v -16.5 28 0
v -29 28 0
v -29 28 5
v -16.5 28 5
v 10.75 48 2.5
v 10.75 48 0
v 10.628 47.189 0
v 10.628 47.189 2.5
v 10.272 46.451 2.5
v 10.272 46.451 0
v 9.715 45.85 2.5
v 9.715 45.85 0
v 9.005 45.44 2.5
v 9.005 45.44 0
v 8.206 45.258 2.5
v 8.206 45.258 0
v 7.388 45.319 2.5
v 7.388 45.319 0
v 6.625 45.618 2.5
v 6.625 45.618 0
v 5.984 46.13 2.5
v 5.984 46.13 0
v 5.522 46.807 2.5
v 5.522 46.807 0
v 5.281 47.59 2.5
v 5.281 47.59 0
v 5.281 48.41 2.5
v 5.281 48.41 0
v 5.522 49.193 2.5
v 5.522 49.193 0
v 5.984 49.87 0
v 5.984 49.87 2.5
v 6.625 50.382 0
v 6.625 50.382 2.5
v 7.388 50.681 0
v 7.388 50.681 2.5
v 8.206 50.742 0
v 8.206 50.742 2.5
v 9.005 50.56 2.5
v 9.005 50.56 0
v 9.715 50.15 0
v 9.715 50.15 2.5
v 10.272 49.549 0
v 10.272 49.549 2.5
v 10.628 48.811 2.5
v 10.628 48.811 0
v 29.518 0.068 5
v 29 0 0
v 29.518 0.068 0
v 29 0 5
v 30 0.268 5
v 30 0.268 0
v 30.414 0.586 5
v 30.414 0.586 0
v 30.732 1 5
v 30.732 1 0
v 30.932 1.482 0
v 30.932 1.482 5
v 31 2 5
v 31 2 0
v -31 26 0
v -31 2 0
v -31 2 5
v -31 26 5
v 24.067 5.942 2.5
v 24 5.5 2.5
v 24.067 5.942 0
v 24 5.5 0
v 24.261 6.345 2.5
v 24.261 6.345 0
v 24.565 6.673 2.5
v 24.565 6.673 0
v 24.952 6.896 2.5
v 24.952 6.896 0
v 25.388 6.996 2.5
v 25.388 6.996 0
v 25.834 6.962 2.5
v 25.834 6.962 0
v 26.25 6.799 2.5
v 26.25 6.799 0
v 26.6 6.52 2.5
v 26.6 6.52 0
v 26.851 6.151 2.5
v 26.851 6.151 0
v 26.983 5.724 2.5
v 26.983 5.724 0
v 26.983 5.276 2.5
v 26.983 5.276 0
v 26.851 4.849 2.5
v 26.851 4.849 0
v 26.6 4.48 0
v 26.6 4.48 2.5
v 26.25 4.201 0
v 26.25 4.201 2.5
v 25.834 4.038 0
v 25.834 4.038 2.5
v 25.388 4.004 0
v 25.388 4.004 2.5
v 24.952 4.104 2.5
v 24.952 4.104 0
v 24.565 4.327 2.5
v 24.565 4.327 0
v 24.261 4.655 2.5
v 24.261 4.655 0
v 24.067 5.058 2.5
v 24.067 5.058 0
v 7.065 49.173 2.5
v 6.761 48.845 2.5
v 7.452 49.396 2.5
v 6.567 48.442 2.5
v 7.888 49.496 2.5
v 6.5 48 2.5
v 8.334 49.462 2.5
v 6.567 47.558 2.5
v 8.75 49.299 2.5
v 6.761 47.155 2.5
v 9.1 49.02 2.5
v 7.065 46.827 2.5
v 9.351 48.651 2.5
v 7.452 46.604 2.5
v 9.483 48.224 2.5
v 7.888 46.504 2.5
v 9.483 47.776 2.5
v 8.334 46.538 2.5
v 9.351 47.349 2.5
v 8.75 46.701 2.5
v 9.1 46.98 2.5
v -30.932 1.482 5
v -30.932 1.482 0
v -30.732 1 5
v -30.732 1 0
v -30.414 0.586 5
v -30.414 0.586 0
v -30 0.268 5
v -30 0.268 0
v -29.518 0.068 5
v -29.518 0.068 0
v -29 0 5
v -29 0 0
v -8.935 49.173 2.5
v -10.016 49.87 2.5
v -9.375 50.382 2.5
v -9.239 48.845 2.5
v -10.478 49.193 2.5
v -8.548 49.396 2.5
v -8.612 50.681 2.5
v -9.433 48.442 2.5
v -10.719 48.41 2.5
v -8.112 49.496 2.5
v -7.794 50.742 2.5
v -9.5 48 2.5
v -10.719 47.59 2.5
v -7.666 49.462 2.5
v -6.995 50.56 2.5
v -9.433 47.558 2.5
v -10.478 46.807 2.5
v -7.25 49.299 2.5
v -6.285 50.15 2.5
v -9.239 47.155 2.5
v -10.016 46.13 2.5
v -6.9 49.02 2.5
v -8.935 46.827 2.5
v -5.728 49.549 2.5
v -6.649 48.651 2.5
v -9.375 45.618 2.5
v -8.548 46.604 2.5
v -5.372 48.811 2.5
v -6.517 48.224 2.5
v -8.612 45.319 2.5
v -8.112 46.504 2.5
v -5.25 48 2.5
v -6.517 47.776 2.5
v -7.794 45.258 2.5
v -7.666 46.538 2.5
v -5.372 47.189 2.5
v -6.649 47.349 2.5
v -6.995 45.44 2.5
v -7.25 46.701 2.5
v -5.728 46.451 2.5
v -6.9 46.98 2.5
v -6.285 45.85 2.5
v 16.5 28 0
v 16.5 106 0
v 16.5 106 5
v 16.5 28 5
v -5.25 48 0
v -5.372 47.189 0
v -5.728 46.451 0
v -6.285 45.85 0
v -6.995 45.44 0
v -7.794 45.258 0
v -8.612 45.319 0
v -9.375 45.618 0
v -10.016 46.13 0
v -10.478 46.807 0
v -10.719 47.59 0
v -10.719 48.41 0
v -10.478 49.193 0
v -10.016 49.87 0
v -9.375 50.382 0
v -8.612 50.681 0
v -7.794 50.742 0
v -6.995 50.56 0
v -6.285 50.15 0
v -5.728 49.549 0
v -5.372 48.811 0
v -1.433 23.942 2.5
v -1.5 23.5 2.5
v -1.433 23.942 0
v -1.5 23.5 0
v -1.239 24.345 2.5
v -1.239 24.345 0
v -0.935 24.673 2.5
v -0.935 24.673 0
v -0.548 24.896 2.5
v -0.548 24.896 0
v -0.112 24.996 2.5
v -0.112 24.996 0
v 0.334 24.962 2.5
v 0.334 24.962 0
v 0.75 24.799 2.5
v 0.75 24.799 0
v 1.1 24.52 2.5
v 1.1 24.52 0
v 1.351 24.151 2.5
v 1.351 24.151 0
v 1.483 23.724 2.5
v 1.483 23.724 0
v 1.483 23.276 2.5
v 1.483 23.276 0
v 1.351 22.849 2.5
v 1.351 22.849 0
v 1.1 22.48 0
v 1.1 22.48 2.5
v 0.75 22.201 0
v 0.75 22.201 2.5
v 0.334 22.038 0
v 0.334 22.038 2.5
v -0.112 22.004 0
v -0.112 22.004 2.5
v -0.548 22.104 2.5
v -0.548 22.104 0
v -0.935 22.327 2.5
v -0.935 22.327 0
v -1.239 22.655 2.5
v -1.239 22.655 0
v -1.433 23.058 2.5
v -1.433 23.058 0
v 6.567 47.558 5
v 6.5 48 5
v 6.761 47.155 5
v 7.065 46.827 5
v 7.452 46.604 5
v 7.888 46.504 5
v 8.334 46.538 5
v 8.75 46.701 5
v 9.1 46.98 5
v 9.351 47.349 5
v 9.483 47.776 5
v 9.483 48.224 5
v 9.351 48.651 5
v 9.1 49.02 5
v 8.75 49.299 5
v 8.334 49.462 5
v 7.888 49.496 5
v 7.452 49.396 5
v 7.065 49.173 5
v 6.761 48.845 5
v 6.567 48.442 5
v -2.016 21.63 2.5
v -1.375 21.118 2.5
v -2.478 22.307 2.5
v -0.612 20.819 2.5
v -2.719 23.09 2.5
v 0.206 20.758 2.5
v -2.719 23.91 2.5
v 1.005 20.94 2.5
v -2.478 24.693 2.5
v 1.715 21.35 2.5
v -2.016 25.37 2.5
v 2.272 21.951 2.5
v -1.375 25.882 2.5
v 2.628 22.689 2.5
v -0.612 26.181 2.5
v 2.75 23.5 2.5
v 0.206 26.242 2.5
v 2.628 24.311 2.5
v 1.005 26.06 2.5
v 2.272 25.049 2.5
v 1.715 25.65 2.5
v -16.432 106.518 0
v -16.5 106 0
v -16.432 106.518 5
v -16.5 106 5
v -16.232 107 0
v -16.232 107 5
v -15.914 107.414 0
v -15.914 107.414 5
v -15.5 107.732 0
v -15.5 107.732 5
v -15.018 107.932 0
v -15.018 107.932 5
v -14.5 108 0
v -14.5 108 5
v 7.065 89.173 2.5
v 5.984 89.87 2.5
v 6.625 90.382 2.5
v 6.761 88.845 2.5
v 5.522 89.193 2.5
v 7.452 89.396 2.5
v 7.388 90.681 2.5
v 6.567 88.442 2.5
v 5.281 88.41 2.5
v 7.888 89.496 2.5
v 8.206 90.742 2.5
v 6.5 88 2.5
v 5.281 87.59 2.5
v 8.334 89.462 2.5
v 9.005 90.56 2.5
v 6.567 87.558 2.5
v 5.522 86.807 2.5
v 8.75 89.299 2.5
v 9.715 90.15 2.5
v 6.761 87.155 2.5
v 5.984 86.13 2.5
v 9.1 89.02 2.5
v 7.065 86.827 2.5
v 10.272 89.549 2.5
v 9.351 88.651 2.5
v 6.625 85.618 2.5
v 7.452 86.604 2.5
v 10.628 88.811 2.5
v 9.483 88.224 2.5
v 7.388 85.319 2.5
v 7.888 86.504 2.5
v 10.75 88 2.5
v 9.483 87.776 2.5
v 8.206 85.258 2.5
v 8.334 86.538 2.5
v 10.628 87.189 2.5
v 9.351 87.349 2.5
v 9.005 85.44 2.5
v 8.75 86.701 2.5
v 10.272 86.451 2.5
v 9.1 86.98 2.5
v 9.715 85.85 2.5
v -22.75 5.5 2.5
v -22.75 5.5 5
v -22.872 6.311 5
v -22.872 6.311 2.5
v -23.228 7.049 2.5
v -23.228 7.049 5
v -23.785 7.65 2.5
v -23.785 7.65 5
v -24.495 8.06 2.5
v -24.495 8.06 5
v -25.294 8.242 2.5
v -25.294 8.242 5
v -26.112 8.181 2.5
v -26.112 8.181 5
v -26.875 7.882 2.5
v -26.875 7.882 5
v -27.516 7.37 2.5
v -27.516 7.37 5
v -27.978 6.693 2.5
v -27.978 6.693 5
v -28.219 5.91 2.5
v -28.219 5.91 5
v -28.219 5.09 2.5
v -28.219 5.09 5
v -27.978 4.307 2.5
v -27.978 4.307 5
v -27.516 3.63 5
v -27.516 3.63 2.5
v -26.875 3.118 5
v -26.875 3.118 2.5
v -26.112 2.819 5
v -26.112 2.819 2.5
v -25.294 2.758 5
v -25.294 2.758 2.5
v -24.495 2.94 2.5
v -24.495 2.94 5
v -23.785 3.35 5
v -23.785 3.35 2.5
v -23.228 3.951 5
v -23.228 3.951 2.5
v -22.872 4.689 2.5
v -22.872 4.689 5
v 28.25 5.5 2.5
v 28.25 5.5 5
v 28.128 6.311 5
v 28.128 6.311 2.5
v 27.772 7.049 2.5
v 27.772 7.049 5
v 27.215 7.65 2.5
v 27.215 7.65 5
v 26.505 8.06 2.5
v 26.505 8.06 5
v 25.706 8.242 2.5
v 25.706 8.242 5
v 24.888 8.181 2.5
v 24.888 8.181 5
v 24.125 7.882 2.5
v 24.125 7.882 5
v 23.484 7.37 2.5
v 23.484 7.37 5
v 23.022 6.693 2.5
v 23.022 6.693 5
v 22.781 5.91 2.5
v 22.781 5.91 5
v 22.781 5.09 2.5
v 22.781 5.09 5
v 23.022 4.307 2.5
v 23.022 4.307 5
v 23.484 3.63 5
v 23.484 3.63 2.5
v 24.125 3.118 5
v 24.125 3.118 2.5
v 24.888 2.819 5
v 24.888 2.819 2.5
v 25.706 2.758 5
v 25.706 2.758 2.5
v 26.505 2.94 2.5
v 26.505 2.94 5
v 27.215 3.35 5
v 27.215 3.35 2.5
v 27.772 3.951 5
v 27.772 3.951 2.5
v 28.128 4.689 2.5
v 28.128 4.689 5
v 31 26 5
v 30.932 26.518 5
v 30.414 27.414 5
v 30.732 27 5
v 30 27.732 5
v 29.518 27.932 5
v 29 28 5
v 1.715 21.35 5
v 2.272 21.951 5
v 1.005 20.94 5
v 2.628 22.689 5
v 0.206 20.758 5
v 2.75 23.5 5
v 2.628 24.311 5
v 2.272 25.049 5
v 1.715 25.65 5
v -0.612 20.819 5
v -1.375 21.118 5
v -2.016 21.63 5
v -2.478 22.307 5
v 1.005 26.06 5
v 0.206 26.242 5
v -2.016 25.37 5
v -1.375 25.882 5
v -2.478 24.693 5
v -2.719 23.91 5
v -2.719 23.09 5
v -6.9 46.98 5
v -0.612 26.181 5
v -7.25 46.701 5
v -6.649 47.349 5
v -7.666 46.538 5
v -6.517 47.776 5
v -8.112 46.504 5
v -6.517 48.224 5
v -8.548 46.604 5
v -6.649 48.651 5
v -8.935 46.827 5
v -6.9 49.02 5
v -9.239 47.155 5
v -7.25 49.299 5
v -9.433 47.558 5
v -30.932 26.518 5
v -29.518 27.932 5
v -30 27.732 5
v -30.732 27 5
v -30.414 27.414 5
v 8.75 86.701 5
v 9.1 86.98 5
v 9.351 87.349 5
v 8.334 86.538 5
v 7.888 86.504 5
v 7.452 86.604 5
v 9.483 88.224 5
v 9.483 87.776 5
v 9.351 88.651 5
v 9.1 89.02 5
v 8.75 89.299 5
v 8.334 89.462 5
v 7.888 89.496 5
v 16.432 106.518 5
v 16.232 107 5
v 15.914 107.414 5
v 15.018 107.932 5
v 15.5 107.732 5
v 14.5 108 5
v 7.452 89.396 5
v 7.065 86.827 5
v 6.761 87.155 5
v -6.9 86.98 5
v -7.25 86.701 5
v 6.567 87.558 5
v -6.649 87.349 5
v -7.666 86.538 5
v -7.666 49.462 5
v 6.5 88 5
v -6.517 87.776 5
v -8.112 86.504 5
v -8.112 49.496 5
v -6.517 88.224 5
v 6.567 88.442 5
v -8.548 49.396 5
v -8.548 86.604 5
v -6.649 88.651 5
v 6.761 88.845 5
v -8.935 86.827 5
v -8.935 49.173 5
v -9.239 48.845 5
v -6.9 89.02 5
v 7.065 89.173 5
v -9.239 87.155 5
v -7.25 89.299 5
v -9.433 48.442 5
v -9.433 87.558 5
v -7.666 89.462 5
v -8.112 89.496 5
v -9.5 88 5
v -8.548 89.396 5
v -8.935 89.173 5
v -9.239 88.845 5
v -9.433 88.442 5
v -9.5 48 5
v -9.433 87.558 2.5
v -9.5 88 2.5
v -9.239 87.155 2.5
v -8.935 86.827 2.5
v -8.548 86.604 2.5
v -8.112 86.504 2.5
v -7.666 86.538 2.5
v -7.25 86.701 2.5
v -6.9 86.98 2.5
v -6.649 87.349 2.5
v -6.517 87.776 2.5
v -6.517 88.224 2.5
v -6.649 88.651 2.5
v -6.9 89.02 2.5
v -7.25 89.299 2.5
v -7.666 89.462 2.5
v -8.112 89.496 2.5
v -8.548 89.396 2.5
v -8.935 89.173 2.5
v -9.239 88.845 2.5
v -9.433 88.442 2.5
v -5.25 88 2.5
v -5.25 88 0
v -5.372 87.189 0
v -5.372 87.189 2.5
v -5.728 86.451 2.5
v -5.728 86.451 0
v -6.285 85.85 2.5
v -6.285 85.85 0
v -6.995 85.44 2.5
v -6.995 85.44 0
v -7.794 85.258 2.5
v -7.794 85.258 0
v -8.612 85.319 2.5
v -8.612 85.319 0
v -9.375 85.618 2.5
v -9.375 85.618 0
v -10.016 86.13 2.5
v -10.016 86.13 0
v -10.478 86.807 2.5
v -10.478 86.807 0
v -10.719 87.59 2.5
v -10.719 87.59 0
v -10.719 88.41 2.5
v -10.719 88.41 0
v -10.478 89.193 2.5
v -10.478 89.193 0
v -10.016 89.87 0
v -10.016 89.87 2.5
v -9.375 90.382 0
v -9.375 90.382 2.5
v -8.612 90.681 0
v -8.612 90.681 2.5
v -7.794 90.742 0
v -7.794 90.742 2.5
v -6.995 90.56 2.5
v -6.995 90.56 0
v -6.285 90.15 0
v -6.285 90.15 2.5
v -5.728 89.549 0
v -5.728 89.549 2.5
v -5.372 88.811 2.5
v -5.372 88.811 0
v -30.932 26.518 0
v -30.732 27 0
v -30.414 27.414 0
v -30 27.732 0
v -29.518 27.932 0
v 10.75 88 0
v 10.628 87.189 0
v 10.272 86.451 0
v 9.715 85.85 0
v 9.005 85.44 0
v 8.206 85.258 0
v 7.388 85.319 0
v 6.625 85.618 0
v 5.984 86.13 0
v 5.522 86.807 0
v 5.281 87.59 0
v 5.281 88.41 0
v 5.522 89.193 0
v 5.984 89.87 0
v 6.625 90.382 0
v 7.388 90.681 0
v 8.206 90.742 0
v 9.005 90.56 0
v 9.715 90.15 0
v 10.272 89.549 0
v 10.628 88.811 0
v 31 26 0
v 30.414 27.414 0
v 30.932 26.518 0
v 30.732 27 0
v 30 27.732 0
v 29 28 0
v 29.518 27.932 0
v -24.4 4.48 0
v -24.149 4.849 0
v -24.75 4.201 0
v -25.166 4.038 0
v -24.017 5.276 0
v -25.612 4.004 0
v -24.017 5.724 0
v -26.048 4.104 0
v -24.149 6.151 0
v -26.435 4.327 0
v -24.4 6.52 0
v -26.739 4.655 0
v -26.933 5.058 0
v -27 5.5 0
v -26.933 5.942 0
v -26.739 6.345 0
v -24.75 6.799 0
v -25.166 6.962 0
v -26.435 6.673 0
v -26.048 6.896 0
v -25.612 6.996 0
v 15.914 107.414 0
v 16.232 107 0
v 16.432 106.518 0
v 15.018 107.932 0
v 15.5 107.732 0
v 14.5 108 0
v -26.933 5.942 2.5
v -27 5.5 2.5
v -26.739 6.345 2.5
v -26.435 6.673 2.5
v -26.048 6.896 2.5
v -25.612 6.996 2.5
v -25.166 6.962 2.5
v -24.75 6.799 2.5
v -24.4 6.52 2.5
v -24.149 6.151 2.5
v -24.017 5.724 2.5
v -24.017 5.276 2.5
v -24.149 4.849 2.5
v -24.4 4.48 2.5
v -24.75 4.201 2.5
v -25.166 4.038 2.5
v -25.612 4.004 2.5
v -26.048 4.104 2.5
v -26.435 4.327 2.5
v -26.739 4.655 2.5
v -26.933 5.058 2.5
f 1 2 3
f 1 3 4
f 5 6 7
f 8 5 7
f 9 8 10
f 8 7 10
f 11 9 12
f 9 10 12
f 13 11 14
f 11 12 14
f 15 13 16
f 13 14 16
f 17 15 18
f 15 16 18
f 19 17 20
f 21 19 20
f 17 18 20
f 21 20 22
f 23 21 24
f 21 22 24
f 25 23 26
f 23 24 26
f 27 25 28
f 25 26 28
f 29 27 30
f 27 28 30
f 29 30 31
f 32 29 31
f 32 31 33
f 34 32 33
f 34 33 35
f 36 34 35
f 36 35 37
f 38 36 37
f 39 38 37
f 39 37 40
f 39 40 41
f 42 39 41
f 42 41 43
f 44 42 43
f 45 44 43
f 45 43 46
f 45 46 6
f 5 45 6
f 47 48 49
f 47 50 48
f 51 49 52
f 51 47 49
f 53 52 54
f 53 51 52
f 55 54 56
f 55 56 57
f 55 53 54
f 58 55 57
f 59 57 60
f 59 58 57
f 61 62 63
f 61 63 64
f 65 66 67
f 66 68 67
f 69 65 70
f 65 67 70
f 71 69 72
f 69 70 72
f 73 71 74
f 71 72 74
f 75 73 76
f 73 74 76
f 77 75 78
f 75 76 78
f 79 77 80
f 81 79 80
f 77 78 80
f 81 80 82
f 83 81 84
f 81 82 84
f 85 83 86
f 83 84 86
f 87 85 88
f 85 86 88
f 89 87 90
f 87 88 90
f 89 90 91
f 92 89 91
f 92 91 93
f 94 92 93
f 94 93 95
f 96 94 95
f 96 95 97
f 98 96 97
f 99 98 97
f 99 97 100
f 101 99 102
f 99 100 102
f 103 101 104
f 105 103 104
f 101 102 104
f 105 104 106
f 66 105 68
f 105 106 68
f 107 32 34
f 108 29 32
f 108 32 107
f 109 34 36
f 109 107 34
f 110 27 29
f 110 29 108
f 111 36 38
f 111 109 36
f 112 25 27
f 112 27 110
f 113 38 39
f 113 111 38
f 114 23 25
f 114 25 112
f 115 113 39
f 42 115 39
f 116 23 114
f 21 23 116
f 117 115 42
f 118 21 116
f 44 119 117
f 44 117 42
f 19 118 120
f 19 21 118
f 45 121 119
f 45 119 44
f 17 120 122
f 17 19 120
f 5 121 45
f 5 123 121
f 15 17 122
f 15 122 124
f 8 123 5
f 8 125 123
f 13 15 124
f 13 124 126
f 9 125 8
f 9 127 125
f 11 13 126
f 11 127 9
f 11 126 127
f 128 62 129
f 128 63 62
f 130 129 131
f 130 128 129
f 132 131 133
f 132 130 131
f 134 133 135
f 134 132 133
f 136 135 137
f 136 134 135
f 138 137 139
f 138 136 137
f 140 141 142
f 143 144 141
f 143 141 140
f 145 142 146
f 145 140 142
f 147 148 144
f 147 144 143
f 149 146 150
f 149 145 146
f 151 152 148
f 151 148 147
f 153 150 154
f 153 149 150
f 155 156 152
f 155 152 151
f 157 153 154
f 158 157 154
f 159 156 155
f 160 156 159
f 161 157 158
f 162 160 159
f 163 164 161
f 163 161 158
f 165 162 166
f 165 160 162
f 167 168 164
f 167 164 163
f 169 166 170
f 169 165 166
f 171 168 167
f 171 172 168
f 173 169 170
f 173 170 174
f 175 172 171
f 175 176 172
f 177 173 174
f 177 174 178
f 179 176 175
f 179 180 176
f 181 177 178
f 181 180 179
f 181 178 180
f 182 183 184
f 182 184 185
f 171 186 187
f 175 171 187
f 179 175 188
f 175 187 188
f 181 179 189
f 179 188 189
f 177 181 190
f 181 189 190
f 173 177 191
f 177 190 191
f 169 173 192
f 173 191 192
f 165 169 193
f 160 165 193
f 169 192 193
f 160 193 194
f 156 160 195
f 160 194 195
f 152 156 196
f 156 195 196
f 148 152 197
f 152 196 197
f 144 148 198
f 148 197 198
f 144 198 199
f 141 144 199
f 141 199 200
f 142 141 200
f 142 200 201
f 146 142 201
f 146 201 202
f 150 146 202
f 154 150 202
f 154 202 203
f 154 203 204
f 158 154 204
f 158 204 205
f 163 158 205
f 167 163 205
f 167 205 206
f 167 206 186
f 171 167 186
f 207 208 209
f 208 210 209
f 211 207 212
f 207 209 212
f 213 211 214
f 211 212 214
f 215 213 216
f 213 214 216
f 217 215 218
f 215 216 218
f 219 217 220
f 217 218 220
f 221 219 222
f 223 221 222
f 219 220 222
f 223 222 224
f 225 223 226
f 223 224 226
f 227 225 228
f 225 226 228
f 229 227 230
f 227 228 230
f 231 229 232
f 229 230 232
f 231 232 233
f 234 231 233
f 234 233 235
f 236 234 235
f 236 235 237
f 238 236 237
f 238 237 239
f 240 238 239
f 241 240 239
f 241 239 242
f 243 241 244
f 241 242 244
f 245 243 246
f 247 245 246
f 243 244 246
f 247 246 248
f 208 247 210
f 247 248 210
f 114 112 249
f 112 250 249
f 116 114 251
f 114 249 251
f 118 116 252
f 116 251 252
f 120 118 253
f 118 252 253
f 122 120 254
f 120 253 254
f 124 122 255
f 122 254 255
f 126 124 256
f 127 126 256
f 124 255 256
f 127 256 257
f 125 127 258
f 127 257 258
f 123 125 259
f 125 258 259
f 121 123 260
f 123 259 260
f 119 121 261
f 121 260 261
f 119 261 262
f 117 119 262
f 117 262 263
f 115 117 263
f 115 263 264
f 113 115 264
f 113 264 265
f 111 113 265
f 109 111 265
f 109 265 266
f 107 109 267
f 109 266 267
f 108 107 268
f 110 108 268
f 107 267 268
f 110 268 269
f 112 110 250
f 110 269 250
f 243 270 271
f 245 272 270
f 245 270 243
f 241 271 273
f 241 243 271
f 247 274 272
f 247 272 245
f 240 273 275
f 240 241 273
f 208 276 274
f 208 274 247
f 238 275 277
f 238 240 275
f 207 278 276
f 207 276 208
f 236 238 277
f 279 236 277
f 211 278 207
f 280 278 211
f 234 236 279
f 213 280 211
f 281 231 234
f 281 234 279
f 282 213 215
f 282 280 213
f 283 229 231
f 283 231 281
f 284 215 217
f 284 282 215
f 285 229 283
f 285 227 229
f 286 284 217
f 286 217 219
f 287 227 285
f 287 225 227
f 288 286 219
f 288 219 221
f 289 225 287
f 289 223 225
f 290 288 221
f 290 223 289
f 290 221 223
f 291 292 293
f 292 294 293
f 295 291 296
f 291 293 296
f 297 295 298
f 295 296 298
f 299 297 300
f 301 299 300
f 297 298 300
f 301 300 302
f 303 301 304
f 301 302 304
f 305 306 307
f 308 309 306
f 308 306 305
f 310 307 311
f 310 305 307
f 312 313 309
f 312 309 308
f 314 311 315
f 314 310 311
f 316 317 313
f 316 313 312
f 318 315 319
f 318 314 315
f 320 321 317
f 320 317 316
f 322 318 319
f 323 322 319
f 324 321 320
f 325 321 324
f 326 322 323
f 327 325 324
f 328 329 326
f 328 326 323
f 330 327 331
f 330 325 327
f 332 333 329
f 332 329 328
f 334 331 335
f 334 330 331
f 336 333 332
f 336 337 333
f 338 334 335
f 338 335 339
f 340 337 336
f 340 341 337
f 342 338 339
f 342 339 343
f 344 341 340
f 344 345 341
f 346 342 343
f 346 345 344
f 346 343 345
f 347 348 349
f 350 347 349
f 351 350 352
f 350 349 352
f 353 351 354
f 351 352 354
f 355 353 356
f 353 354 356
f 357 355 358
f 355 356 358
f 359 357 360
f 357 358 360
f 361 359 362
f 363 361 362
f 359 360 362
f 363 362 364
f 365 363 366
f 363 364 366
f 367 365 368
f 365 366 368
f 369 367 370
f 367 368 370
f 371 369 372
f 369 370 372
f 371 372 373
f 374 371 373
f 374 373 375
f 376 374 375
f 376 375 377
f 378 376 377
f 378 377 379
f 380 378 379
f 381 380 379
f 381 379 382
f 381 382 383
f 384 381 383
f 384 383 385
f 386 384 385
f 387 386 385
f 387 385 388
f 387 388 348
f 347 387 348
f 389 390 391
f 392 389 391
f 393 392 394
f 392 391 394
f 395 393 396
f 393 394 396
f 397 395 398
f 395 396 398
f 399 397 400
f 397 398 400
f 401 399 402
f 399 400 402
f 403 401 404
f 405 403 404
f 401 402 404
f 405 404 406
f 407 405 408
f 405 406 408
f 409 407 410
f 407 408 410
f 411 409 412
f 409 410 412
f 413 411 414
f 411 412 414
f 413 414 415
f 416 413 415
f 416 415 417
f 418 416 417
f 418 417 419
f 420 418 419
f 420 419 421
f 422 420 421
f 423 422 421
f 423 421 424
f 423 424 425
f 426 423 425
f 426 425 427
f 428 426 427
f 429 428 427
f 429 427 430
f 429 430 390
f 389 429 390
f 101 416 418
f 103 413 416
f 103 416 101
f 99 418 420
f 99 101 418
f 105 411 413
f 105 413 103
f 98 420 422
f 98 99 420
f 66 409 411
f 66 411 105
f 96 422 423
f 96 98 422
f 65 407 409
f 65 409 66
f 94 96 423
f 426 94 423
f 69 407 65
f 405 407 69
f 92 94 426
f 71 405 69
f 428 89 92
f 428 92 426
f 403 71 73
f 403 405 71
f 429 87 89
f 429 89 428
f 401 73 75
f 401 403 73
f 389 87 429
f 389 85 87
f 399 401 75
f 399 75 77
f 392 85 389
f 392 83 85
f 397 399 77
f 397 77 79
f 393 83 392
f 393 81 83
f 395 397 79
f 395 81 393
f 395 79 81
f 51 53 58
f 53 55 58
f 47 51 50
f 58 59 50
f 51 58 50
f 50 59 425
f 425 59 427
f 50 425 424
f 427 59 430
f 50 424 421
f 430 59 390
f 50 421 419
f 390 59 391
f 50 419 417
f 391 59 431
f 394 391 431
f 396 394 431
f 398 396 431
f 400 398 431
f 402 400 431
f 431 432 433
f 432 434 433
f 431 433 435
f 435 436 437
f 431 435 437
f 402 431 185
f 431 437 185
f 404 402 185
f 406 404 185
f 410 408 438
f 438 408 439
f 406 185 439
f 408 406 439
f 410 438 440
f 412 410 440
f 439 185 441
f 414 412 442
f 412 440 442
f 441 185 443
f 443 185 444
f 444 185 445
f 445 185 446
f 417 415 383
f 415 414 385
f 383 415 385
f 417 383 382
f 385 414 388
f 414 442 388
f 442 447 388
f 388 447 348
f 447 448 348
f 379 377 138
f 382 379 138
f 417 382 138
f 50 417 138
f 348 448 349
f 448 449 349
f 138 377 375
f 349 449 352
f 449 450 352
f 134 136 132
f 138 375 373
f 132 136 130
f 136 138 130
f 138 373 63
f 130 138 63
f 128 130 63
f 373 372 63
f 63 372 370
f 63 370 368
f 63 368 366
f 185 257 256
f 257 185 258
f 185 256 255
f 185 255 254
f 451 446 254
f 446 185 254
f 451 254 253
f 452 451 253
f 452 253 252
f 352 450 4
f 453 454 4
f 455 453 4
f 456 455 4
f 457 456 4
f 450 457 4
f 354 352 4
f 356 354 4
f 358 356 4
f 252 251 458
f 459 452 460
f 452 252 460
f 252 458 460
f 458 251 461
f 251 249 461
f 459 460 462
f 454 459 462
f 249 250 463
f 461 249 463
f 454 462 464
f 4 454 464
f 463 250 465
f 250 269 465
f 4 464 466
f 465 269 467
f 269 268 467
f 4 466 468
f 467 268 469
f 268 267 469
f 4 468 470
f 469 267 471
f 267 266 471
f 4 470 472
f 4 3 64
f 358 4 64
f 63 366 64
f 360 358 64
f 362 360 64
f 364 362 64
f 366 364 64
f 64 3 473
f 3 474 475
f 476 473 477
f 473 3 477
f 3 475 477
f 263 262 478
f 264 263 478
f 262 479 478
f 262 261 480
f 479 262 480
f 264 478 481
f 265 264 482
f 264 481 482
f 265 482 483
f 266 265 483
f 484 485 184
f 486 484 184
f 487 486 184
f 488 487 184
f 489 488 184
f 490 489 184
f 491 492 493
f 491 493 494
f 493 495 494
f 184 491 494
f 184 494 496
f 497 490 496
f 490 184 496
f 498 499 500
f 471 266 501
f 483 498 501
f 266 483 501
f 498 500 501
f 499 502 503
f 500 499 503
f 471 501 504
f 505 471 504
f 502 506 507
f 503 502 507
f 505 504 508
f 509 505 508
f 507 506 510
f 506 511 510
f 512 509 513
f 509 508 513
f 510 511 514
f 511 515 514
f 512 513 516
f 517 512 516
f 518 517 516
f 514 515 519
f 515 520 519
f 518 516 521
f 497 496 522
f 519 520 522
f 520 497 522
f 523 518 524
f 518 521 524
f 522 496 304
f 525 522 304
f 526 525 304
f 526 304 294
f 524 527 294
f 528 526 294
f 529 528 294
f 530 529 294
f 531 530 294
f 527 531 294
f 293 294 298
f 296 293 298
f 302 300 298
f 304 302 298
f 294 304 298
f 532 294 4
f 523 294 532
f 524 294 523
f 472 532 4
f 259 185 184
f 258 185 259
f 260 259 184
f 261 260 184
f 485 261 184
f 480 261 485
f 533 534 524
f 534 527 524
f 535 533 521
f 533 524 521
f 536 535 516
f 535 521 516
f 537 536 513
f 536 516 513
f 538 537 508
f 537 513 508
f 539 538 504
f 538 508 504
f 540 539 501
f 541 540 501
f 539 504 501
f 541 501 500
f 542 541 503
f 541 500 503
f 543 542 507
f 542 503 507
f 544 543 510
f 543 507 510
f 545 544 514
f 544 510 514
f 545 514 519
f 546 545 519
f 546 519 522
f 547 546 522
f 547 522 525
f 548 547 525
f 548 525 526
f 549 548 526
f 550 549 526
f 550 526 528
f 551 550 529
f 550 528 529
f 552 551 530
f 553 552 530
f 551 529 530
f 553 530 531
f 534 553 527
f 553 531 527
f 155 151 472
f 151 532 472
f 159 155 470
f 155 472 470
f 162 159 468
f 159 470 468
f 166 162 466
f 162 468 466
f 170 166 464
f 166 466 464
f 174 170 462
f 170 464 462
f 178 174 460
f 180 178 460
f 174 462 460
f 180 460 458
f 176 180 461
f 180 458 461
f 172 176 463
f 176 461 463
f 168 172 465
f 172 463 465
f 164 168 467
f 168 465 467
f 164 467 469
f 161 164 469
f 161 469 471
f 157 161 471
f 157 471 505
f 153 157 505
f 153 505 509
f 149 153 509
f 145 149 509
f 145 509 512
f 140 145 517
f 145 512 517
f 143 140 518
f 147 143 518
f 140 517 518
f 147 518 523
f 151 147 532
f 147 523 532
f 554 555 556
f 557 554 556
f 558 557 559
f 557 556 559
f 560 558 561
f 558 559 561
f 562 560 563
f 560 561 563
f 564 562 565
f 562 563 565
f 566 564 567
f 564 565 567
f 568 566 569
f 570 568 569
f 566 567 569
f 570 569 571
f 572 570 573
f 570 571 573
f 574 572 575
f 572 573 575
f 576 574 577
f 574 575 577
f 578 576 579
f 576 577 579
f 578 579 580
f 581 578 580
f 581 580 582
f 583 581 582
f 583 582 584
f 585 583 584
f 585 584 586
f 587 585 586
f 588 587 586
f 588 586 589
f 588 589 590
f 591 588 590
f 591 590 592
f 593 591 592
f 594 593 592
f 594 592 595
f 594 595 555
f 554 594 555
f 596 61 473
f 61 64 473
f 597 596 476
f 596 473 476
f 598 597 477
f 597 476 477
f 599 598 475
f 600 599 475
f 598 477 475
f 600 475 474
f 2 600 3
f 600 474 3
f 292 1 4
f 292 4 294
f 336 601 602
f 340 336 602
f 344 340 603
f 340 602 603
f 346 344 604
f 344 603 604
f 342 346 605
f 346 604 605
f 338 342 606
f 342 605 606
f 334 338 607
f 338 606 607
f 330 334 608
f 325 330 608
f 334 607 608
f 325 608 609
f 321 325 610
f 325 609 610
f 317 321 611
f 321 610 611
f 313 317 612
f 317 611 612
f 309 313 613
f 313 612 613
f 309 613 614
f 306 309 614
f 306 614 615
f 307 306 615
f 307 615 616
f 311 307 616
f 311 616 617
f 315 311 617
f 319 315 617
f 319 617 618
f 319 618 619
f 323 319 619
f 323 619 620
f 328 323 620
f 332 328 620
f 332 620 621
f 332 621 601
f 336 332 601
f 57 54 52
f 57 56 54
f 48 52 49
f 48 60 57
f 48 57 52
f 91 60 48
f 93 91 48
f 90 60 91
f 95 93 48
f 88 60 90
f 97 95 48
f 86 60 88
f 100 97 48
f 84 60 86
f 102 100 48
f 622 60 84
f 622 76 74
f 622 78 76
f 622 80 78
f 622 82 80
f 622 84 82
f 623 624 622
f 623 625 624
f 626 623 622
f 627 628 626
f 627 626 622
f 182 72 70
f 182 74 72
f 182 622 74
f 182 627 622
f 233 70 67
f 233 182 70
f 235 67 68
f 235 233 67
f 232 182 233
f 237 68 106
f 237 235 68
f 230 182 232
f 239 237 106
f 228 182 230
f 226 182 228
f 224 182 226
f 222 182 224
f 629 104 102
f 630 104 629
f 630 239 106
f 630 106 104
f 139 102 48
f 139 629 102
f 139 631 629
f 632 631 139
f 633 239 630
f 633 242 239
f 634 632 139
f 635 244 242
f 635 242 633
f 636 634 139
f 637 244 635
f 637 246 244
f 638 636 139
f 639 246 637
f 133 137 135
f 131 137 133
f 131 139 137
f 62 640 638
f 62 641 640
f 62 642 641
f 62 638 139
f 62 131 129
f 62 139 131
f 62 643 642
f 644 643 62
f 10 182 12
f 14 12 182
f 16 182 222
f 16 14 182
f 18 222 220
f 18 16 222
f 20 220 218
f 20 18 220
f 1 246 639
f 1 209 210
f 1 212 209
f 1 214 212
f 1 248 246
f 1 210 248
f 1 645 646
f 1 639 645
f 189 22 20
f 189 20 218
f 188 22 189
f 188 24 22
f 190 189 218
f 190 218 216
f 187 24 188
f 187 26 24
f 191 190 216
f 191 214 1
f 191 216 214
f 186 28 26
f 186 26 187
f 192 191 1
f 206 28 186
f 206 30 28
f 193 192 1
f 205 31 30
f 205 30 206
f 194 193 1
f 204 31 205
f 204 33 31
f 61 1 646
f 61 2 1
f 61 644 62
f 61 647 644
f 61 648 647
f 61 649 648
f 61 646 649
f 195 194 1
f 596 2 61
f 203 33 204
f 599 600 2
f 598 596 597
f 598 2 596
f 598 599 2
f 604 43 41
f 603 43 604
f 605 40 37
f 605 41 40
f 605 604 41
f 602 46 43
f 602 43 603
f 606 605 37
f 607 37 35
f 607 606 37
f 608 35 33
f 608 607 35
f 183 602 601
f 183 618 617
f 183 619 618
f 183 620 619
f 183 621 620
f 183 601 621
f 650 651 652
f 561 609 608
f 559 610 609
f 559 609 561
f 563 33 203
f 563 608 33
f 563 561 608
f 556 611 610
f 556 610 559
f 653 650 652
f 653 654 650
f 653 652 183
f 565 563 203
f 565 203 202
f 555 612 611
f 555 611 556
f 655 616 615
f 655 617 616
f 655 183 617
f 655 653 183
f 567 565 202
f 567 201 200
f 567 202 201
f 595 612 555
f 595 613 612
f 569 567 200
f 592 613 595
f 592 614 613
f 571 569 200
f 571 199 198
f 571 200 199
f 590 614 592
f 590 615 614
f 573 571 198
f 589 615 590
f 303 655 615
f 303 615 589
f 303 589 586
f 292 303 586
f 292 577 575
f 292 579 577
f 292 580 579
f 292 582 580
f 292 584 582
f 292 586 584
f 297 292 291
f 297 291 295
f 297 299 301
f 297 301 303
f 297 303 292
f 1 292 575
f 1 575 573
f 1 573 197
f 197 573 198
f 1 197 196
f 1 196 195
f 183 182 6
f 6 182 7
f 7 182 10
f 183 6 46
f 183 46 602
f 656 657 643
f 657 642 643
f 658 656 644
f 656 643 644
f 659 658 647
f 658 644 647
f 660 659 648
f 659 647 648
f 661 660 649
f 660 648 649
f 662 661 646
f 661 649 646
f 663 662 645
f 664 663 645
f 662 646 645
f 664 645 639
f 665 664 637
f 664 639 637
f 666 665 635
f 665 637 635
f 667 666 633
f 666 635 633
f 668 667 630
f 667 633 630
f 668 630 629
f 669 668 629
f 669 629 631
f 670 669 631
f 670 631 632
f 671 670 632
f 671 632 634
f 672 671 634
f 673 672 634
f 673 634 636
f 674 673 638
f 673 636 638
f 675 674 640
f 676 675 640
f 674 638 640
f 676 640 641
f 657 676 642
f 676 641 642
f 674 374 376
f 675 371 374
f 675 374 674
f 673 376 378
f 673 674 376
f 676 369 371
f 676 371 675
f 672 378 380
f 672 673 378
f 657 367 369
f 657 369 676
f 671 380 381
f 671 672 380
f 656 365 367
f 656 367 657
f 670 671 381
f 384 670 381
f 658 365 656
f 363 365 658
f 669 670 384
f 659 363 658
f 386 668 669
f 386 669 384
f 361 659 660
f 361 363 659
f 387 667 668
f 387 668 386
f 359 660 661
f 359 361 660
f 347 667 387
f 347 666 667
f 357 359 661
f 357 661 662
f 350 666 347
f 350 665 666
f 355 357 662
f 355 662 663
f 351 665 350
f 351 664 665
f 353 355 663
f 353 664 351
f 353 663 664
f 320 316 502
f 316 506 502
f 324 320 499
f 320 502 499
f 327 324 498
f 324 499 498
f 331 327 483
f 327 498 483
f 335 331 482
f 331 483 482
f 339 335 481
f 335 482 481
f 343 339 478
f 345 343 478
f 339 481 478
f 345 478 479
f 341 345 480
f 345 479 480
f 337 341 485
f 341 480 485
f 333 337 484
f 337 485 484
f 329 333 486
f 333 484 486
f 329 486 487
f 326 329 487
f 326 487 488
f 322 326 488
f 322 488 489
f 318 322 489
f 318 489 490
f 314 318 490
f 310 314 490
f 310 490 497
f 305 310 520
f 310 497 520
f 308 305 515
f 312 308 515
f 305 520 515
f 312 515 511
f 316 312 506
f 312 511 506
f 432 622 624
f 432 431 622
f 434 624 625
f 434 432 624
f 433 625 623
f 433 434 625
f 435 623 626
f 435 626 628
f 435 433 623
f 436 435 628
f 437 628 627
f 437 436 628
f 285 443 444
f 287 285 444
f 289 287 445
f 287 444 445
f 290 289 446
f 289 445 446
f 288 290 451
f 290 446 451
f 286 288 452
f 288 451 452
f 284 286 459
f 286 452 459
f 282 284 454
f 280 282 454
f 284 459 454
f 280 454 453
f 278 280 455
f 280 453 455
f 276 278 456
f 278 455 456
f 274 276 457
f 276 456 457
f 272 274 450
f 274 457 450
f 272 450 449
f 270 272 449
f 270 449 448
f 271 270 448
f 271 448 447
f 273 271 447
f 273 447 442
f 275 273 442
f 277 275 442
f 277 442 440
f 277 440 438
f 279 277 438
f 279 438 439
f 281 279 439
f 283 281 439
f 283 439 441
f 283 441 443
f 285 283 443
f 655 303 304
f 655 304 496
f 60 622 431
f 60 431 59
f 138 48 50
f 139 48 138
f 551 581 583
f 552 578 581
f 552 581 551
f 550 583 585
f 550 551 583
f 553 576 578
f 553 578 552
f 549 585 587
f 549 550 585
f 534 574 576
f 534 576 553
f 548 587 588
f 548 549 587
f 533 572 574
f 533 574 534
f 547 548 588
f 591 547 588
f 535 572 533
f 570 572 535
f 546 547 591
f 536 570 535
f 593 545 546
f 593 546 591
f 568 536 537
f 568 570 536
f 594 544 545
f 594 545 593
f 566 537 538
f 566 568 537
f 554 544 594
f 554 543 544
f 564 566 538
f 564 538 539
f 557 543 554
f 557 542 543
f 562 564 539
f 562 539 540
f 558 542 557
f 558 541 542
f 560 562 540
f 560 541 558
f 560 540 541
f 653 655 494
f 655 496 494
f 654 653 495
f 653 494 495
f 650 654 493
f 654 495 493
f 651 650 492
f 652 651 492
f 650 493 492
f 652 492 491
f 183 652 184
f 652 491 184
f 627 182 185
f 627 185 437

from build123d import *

# Parameters (mm, degrees)
BOSS_EXTRUDE1_DEPTH = 5
HOLE1_D             = 3
HOLE1_CBORE_D       = 5.5
HOLE1_CBORE_DEPTH   = 2.5
HOLE2_D             = 3
HOLE2_CBORE_D       = 5.5
HOLE2_CBORE_DEPTH   = 2.5
FILLET1_R           = 2


with BuildPart() as part:
    # Sketch2 → Boss-Extrude1 (new body)
    with BuildSketch(Plane.XY):
        Polygon((-31, 0), (-31, 28), (-16.5, 28), (-16.5, 108), (16.5, 108), (16.5, 28), (31, 28), (31, 0), align=None)
    extrude(amount=BOSS_EXTRUDE1_DEPTH)

    # Hole1 (through all)
    with Locations(Plane.XY.offset(5)):
        with Locations((-25.5, 5.5), (25.5, 5.5), (0, 23.5)):
            CounterBoreHole(HOLE1_D / 2, HOLE1_CBORE_D / 2, HOLE1_CBORE_DEPTH)

    # Hole2 (through all)
    with Locations(Plane(origin=(0, 0, 0), x_dir=(1, 0, 0), z_dir=(0, 0, -1))):
        with Locations((8, -48), (-8, -48), (-8, -88), (8, -88)):
            CounterBoreHole(HOLE2_D / 2, HOLE2_CBORE_D / 2, HOLE2_CBORE_DEPTH)

    # Fillet1
    fillet1_edges = [part.edges().sort_by_distance(p)[0] for p in [
        (-31, 0, 2.5),
        (-31, 28, 2.5),
        (-16.5, 108, 2.5),
        (16.5, 108, 2.5),
        (31, 28, 2.5),
        (31, 0, 2.5),
    ]]
    fillet(fillet1_edges, radius=FILLET1_R)


solid = part.part
